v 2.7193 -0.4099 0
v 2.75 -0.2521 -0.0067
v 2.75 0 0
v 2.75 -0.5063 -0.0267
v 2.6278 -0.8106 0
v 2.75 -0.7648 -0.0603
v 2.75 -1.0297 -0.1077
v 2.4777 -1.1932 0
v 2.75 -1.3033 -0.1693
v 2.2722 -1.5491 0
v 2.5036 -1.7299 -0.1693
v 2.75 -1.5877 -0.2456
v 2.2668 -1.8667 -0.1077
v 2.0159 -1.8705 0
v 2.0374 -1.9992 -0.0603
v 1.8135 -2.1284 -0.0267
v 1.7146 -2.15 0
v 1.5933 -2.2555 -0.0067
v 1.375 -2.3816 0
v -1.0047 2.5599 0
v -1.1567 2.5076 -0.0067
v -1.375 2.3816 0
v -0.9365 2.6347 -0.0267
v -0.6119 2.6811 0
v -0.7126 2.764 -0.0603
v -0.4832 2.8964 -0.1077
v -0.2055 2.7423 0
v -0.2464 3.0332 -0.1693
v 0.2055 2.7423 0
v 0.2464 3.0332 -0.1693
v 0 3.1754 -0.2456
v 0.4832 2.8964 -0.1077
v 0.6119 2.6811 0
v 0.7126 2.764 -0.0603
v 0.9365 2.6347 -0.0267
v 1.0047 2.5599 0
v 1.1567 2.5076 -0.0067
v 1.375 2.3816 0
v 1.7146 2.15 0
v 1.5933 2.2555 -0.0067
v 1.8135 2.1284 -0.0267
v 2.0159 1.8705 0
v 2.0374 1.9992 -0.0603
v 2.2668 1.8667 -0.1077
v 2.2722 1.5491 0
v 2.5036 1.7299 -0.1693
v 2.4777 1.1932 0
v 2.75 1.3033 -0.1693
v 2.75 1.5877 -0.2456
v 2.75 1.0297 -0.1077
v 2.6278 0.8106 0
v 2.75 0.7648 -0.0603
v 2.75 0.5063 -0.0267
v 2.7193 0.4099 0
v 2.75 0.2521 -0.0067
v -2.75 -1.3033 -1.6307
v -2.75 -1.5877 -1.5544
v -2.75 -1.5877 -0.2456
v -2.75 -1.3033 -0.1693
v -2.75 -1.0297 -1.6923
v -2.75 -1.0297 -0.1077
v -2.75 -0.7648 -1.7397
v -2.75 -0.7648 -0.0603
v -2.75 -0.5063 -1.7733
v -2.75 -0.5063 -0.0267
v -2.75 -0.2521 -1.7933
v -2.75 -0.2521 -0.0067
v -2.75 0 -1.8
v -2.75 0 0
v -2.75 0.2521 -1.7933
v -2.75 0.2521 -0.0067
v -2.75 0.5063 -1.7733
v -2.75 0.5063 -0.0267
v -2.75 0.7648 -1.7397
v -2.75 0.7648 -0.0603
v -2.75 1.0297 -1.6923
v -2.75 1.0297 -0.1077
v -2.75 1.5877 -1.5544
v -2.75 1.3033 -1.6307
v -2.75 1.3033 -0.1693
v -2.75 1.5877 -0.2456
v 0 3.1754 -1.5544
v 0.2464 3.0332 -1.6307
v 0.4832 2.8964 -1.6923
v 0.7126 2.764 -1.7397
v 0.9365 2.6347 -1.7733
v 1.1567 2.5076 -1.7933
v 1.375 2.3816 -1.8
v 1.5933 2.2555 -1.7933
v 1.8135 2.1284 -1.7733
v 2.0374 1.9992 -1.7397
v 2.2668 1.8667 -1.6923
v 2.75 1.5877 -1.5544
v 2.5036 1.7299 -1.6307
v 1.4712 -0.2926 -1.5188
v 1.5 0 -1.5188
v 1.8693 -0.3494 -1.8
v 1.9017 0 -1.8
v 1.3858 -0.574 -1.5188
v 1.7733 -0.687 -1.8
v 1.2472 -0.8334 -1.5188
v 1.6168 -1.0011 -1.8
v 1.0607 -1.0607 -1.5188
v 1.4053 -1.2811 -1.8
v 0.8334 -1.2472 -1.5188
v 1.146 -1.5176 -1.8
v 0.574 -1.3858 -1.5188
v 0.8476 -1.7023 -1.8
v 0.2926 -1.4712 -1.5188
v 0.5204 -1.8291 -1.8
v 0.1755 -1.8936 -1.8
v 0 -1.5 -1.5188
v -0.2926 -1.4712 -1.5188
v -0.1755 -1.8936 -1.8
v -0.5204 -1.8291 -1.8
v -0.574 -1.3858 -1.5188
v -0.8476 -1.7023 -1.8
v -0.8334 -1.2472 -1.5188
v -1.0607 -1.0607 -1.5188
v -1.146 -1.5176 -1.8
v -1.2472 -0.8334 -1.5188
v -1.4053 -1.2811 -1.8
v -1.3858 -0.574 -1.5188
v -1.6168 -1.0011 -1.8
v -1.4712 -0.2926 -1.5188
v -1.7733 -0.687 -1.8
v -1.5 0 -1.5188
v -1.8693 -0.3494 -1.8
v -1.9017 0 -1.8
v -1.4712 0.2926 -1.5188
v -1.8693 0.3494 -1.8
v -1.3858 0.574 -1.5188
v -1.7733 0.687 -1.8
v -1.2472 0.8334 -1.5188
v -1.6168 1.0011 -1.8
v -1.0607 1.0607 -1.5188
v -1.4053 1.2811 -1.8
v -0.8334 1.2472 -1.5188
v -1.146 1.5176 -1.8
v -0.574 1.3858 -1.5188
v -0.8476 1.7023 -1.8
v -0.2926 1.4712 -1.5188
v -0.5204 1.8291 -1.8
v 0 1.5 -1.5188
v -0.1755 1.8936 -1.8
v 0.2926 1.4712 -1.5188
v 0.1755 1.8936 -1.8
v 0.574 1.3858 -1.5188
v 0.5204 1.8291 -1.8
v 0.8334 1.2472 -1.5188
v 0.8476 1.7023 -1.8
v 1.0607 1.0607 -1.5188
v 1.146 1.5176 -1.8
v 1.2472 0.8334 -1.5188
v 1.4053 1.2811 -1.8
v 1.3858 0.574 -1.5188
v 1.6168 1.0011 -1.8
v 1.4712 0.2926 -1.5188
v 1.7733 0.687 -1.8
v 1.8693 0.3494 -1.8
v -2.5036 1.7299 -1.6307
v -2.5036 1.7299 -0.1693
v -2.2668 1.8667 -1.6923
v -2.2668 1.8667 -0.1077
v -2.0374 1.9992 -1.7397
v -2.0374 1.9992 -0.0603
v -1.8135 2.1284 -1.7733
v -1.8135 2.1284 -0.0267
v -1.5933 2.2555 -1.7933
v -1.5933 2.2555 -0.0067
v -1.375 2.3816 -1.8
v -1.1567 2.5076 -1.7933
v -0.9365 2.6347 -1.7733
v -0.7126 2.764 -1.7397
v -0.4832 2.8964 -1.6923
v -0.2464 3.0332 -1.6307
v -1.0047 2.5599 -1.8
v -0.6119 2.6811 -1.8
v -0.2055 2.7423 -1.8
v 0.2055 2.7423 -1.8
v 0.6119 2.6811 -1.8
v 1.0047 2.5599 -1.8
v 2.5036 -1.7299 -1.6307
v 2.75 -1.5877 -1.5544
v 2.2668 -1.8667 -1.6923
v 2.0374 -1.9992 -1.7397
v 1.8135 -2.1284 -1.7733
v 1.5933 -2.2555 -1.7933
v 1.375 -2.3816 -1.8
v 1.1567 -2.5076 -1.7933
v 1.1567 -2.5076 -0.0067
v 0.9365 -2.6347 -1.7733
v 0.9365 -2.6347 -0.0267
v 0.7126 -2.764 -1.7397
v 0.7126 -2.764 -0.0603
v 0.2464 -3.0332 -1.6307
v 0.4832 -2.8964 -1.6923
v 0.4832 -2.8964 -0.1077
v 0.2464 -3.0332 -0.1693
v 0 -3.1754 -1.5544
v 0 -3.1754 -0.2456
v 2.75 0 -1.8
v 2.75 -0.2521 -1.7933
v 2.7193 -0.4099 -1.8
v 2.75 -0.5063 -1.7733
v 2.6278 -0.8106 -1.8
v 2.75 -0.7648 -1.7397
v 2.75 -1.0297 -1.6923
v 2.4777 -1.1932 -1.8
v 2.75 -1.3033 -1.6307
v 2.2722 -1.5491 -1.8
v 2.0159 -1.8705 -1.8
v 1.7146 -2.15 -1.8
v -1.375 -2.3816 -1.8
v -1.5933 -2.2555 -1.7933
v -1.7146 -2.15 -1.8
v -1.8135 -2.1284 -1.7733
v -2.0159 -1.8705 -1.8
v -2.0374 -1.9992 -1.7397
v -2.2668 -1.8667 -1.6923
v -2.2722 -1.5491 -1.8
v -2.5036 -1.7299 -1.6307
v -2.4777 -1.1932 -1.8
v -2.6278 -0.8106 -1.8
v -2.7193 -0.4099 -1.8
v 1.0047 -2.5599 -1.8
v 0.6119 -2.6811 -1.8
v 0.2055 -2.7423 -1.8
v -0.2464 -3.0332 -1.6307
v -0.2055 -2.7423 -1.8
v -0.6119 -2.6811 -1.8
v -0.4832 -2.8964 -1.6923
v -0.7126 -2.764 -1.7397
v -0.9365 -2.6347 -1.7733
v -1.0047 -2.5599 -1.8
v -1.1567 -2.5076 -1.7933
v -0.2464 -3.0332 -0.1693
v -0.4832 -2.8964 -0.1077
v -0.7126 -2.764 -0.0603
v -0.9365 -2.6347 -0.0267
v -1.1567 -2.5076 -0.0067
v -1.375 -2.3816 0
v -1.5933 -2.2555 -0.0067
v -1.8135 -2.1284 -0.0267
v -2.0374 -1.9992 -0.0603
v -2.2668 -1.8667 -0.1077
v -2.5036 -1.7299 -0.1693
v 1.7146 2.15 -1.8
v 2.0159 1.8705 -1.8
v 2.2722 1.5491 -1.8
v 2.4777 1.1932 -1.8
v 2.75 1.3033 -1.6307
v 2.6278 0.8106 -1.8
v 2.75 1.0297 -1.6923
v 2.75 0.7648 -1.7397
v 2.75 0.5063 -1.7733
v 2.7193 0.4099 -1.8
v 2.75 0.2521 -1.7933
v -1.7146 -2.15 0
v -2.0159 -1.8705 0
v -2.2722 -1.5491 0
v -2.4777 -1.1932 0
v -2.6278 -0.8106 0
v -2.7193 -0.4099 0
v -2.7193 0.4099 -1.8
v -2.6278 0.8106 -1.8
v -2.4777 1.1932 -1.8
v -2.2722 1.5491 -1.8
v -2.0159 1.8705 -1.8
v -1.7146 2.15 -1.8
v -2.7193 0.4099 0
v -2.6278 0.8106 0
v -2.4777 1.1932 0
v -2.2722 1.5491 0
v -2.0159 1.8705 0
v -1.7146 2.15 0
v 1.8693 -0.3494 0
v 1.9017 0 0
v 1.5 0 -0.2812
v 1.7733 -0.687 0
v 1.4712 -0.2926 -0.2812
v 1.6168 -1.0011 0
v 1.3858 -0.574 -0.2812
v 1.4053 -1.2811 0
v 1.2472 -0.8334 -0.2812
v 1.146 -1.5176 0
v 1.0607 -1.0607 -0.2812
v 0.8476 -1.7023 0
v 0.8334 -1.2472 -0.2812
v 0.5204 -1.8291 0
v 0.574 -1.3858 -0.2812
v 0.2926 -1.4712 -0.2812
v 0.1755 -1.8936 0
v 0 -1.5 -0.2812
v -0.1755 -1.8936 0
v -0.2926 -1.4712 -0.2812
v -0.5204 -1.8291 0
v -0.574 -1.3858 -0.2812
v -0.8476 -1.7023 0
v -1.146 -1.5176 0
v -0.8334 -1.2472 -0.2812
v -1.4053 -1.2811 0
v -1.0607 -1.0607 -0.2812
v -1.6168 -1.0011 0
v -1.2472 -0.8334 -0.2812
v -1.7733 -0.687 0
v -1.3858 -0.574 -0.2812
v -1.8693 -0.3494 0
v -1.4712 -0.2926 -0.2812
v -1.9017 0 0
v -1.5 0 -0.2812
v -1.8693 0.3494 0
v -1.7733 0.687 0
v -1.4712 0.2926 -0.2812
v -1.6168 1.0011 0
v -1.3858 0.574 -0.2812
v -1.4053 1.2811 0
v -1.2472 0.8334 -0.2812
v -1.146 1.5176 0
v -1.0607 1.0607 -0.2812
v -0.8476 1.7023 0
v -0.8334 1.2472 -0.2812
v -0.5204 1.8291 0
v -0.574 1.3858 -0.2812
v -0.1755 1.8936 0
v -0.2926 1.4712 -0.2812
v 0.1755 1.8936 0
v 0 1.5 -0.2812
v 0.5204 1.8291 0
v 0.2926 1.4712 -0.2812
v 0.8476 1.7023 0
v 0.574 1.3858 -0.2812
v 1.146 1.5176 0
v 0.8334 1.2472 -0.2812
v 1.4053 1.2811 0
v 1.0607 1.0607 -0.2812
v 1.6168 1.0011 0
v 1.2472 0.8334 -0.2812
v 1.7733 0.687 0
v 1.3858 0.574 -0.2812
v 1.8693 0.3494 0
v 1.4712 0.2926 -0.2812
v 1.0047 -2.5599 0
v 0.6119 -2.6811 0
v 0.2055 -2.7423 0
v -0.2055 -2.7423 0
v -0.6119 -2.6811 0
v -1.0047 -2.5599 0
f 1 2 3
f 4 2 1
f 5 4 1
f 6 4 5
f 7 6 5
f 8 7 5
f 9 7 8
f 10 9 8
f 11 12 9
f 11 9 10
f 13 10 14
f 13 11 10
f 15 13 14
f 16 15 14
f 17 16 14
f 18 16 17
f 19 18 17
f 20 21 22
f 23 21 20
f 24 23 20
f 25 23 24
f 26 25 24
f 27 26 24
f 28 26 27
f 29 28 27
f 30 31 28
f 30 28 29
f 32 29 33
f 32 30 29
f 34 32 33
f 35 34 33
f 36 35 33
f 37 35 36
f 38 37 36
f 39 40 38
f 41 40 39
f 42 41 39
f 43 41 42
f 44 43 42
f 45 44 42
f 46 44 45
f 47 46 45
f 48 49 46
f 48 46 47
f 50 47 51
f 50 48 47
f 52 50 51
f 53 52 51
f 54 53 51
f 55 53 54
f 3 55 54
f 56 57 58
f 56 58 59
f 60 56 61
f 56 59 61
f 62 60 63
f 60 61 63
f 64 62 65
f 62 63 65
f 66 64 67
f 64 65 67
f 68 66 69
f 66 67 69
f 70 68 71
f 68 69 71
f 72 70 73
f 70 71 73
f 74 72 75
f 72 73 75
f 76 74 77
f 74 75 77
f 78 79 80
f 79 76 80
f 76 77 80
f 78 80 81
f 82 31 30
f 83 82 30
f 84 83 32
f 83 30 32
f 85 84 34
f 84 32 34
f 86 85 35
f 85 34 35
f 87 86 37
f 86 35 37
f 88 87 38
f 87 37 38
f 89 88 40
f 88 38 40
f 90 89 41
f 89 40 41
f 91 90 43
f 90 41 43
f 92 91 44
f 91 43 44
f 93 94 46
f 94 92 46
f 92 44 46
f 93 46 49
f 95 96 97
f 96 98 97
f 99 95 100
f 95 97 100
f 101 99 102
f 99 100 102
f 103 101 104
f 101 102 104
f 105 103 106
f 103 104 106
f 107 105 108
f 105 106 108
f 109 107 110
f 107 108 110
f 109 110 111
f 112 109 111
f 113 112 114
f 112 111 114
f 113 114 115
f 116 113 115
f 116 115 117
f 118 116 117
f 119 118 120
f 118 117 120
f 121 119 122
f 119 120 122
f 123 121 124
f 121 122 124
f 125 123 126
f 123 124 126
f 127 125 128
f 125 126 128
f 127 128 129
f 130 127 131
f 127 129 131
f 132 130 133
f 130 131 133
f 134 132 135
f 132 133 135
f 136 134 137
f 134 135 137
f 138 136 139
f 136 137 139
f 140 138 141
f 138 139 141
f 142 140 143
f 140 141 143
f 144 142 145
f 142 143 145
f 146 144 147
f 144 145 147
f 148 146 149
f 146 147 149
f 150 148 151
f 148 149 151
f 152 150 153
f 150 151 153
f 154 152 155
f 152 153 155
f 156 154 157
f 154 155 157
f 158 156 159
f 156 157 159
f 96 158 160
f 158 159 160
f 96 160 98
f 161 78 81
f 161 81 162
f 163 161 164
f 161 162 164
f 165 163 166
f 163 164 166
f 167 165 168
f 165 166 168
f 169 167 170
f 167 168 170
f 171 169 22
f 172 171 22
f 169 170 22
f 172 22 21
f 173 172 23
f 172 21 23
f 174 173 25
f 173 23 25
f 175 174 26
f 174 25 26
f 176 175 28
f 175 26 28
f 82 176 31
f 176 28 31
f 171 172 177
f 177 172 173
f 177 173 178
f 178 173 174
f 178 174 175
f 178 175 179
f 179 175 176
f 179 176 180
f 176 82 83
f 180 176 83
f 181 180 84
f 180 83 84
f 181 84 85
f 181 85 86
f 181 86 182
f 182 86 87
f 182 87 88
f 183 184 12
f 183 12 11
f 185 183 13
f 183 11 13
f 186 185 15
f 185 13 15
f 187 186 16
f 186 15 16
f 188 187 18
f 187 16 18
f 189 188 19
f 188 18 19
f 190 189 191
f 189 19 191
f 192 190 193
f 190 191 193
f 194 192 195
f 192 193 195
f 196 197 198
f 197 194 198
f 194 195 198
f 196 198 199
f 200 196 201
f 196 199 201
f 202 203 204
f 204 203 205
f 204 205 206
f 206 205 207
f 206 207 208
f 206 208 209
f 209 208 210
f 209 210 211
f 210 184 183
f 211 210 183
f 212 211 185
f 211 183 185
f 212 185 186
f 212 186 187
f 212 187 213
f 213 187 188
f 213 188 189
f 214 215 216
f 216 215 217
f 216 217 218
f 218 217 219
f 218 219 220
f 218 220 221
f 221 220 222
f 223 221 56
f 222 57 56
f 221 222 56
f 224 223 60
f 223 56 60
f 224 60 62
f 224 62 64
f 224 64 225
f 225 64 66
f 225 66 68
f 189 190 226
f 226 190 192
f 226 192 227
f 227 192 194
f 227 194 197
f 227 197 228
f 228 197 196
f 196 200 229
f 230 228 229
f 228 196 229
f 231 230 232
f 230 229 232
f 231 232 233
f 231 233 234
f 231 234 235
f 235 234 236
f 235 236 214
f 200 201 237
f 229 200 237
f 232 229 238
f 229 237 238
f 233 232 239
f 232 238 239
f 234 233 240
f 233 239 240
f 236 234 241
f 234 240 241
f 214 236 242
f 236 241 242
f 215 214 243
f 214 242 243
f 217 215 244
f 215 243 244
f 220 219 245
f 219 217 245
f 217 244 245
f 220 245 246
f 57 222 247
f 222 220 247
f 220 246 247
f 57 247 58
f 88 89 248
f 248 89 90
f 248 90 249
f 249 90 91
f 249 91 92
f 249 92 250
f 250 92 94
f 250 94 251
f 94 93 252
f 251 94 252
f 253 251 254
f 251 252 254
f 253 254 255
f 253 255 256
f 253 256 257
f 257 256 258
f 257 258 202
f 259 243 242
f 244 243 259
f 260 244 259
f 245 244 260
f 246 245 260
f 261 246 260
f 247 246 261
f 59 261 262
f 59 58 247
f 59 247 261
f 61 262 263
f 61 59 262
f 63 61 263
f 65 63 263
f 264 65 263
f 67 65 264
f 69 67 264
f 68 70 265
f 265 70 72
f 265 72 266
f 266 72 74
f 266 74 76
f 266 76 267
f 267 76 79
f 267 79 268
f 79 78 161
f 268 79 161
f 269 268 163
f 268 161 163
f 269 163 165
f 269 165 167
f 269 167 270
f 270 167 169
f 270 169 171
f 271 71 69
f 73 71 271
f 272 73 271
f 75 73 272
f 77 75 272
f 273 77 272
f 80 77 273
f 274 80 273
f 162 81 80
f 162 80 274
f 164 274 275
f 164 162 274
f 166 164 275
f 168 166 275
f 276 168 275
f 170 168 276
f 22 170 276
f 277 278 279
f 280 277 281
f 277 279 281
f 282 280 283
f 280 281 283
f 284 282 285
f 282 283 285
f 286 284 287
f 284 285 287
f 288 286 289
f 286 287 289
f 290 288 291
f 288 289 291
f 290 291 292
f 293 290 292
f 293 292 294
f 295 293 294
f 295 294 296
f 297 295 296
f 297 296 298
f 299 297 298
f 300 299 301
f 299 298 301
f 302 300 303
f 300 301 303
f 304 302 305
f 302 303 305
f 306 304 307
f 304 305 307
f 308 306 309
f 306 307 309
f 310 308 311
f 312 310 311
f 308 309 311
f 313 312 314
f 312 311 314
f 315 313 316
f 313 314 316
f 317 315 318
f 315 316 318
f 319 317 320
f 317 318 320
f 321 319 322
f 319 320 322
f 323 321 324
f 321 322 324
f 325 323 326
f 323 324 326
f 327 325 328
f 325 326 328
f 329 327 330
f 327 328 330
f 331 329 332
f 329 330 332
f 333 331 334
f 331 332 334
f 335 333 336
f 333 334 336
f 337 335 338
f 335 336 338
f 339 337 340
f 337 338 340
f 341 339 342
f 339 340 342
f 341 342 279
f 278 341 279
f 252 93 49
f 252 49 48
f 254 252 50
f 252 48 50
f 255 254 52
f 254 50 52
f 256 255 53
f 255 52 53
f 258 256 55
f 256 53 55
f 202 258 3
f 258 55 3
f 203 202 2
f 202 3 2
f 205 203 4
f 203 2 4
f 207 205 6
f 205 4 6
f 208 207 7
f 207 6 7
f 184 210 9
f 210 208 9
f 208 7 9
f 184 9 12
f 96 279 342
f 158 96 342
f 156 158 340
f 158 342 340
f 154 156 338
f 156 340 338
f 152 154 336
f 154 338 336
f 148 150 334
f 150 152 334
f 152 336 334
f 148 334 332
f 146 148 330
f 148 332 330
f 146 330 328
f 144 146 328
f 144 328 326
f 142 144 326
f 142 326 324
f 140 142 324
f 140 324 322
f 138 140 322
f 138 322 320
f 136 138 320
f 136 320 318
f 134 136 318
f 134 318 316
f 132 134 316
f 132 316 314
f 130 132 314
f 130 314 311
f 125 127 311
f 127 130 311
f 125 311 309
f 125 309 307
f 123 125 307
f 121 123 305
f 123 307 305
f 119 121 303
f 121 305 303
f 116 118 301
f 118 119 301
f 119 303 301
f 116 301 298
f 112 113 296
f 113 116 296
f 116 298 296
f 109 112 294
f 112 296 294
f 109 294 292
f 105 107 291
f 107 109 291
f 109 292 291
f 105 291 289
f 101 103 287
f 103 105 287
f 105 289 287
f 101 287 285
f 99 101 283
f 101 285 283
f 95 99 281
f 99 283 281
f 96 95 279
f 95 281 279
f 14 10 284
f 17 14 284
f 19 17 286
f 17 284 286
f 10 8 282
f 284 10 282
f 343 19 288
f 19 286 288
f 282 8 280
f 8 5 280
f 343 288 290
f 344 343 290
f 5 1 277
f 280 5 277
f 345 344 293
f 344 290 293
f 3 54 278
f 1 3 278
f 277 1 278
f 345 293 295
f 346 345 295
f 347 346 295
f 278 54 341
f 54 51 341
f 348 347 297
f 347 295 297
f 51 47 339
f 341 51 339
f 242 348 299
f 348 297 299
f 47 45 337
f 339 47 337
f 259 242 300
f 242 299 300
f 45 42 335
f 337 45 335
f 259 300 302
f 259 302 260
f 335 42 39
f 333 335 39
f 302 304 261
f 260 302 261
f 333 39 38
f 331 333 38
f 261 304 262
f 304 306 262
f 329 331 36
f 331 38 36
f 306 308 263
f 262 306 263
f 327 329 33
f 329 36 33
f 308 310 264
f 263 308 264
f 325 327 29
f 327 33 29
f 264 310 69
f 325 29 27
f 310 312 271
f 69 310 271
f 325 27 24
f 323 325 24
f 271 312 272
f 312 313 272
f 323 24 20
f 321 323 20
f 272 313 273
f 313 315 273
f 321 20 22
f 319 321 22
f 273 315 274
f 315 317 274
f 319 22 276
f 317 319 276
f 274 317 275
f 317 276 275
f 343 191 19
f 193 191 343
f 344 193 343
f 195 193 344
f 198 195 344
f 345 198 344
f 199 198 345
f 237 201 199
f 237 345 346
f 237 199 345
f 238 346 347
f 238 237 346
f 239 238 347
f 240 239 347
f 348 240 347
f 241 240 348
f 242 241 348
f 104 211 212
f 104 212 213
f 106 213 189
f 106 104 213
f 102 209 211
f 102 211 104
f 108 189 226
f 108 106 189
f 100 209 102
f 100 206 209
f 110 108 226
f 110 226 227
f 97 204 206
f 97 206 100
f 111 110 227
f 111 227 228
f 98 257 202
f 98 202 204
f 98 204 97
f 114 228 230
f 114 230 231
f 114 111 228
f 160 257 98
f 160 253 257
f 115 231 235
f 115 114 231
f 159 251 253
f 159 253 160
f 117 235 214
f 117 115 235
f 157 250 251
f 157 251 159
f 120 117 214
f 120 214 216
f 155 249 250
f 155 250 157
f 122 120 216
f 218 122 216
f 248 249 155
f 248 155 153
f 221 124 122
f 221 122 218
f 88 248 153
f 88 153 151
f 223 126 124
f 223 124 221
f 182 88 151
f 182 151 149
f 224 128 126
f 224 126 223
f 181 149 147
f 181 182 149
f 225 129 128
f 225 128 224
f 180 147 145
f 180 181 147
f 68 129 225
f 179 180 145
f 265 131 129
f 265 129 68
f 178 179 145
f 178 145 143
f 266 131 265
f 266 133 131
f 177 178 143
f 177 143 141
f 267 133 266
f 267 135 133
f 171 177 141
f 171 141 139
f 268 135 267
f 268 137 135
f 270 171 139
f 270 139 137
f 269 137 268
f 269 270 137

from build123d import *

# Parameters (mm, degrees)
BASENUTSKE_R  = 1.5
BASENUT_DEPTH = 1.8


with BuildPart() as part:
    # BaseNutSke → BaseNut (new body)
    with BuildSketch(Plane.XY):
        Polygon((2.75, 1.58771324), (2.75, -1.58771324), (0, -3.175426481), (-2.75, -1.58771324), (-2.75, 1.58771324), (0, 3.175426481), align=None)
        Circle(BASENUTSKE_R, mode=Mode.SUBTRACT)
    extrude(amount=-BASENUT_DEPTH)

    # Sketch3 → Double-Chamfer (revolve, cut)
    with BuildSketch(Plane(origin=(0, 0, 0), x_dir=(0, 0, -1), z_dir=(1, 0, 0))):
        Polygon((1.8, 2.75), (1.554379907, 3.175426481), (1.554379907, 13.175426481), (11.8, 13.175426481), (11.8, 2.75), align=None)
        Polygon((0.245620093, 13.175426481), (-10, 13.175426481), (-10, 2.75), (0, 2.75), (0.245620093, 3.175426481), align=None)
    revolve(axis=Axis((0, 0, 0), (0, 0, -1)), mode=Mode.SUBTRACT)

    # Sketch5 → EndChamfer (revolve, cut)
    with BuildSketch(Plane(origin=(0, 0, 0), x_dir=(0, 0, -1), z_dir=(1, 0, 0)), mode=Mode.PRIVATE) as endchamfer_sk:
        Polygon((0, 1.901666627), (0.28125, 1.5), (0, 1.5), align=None)
        Polygon((1.8, 1.901666627), (1.8, 1.5), (1.51875, 1.5), align=None)
    revolve(endchamfer_sk.sketch.rotate(Axis((0, 0, 0), (0, 0, -1)), 90), axis=Axis((0, 0, 0), (0, 0, -1)), mode=Mode.SUBTRACT)


solid = part.part
